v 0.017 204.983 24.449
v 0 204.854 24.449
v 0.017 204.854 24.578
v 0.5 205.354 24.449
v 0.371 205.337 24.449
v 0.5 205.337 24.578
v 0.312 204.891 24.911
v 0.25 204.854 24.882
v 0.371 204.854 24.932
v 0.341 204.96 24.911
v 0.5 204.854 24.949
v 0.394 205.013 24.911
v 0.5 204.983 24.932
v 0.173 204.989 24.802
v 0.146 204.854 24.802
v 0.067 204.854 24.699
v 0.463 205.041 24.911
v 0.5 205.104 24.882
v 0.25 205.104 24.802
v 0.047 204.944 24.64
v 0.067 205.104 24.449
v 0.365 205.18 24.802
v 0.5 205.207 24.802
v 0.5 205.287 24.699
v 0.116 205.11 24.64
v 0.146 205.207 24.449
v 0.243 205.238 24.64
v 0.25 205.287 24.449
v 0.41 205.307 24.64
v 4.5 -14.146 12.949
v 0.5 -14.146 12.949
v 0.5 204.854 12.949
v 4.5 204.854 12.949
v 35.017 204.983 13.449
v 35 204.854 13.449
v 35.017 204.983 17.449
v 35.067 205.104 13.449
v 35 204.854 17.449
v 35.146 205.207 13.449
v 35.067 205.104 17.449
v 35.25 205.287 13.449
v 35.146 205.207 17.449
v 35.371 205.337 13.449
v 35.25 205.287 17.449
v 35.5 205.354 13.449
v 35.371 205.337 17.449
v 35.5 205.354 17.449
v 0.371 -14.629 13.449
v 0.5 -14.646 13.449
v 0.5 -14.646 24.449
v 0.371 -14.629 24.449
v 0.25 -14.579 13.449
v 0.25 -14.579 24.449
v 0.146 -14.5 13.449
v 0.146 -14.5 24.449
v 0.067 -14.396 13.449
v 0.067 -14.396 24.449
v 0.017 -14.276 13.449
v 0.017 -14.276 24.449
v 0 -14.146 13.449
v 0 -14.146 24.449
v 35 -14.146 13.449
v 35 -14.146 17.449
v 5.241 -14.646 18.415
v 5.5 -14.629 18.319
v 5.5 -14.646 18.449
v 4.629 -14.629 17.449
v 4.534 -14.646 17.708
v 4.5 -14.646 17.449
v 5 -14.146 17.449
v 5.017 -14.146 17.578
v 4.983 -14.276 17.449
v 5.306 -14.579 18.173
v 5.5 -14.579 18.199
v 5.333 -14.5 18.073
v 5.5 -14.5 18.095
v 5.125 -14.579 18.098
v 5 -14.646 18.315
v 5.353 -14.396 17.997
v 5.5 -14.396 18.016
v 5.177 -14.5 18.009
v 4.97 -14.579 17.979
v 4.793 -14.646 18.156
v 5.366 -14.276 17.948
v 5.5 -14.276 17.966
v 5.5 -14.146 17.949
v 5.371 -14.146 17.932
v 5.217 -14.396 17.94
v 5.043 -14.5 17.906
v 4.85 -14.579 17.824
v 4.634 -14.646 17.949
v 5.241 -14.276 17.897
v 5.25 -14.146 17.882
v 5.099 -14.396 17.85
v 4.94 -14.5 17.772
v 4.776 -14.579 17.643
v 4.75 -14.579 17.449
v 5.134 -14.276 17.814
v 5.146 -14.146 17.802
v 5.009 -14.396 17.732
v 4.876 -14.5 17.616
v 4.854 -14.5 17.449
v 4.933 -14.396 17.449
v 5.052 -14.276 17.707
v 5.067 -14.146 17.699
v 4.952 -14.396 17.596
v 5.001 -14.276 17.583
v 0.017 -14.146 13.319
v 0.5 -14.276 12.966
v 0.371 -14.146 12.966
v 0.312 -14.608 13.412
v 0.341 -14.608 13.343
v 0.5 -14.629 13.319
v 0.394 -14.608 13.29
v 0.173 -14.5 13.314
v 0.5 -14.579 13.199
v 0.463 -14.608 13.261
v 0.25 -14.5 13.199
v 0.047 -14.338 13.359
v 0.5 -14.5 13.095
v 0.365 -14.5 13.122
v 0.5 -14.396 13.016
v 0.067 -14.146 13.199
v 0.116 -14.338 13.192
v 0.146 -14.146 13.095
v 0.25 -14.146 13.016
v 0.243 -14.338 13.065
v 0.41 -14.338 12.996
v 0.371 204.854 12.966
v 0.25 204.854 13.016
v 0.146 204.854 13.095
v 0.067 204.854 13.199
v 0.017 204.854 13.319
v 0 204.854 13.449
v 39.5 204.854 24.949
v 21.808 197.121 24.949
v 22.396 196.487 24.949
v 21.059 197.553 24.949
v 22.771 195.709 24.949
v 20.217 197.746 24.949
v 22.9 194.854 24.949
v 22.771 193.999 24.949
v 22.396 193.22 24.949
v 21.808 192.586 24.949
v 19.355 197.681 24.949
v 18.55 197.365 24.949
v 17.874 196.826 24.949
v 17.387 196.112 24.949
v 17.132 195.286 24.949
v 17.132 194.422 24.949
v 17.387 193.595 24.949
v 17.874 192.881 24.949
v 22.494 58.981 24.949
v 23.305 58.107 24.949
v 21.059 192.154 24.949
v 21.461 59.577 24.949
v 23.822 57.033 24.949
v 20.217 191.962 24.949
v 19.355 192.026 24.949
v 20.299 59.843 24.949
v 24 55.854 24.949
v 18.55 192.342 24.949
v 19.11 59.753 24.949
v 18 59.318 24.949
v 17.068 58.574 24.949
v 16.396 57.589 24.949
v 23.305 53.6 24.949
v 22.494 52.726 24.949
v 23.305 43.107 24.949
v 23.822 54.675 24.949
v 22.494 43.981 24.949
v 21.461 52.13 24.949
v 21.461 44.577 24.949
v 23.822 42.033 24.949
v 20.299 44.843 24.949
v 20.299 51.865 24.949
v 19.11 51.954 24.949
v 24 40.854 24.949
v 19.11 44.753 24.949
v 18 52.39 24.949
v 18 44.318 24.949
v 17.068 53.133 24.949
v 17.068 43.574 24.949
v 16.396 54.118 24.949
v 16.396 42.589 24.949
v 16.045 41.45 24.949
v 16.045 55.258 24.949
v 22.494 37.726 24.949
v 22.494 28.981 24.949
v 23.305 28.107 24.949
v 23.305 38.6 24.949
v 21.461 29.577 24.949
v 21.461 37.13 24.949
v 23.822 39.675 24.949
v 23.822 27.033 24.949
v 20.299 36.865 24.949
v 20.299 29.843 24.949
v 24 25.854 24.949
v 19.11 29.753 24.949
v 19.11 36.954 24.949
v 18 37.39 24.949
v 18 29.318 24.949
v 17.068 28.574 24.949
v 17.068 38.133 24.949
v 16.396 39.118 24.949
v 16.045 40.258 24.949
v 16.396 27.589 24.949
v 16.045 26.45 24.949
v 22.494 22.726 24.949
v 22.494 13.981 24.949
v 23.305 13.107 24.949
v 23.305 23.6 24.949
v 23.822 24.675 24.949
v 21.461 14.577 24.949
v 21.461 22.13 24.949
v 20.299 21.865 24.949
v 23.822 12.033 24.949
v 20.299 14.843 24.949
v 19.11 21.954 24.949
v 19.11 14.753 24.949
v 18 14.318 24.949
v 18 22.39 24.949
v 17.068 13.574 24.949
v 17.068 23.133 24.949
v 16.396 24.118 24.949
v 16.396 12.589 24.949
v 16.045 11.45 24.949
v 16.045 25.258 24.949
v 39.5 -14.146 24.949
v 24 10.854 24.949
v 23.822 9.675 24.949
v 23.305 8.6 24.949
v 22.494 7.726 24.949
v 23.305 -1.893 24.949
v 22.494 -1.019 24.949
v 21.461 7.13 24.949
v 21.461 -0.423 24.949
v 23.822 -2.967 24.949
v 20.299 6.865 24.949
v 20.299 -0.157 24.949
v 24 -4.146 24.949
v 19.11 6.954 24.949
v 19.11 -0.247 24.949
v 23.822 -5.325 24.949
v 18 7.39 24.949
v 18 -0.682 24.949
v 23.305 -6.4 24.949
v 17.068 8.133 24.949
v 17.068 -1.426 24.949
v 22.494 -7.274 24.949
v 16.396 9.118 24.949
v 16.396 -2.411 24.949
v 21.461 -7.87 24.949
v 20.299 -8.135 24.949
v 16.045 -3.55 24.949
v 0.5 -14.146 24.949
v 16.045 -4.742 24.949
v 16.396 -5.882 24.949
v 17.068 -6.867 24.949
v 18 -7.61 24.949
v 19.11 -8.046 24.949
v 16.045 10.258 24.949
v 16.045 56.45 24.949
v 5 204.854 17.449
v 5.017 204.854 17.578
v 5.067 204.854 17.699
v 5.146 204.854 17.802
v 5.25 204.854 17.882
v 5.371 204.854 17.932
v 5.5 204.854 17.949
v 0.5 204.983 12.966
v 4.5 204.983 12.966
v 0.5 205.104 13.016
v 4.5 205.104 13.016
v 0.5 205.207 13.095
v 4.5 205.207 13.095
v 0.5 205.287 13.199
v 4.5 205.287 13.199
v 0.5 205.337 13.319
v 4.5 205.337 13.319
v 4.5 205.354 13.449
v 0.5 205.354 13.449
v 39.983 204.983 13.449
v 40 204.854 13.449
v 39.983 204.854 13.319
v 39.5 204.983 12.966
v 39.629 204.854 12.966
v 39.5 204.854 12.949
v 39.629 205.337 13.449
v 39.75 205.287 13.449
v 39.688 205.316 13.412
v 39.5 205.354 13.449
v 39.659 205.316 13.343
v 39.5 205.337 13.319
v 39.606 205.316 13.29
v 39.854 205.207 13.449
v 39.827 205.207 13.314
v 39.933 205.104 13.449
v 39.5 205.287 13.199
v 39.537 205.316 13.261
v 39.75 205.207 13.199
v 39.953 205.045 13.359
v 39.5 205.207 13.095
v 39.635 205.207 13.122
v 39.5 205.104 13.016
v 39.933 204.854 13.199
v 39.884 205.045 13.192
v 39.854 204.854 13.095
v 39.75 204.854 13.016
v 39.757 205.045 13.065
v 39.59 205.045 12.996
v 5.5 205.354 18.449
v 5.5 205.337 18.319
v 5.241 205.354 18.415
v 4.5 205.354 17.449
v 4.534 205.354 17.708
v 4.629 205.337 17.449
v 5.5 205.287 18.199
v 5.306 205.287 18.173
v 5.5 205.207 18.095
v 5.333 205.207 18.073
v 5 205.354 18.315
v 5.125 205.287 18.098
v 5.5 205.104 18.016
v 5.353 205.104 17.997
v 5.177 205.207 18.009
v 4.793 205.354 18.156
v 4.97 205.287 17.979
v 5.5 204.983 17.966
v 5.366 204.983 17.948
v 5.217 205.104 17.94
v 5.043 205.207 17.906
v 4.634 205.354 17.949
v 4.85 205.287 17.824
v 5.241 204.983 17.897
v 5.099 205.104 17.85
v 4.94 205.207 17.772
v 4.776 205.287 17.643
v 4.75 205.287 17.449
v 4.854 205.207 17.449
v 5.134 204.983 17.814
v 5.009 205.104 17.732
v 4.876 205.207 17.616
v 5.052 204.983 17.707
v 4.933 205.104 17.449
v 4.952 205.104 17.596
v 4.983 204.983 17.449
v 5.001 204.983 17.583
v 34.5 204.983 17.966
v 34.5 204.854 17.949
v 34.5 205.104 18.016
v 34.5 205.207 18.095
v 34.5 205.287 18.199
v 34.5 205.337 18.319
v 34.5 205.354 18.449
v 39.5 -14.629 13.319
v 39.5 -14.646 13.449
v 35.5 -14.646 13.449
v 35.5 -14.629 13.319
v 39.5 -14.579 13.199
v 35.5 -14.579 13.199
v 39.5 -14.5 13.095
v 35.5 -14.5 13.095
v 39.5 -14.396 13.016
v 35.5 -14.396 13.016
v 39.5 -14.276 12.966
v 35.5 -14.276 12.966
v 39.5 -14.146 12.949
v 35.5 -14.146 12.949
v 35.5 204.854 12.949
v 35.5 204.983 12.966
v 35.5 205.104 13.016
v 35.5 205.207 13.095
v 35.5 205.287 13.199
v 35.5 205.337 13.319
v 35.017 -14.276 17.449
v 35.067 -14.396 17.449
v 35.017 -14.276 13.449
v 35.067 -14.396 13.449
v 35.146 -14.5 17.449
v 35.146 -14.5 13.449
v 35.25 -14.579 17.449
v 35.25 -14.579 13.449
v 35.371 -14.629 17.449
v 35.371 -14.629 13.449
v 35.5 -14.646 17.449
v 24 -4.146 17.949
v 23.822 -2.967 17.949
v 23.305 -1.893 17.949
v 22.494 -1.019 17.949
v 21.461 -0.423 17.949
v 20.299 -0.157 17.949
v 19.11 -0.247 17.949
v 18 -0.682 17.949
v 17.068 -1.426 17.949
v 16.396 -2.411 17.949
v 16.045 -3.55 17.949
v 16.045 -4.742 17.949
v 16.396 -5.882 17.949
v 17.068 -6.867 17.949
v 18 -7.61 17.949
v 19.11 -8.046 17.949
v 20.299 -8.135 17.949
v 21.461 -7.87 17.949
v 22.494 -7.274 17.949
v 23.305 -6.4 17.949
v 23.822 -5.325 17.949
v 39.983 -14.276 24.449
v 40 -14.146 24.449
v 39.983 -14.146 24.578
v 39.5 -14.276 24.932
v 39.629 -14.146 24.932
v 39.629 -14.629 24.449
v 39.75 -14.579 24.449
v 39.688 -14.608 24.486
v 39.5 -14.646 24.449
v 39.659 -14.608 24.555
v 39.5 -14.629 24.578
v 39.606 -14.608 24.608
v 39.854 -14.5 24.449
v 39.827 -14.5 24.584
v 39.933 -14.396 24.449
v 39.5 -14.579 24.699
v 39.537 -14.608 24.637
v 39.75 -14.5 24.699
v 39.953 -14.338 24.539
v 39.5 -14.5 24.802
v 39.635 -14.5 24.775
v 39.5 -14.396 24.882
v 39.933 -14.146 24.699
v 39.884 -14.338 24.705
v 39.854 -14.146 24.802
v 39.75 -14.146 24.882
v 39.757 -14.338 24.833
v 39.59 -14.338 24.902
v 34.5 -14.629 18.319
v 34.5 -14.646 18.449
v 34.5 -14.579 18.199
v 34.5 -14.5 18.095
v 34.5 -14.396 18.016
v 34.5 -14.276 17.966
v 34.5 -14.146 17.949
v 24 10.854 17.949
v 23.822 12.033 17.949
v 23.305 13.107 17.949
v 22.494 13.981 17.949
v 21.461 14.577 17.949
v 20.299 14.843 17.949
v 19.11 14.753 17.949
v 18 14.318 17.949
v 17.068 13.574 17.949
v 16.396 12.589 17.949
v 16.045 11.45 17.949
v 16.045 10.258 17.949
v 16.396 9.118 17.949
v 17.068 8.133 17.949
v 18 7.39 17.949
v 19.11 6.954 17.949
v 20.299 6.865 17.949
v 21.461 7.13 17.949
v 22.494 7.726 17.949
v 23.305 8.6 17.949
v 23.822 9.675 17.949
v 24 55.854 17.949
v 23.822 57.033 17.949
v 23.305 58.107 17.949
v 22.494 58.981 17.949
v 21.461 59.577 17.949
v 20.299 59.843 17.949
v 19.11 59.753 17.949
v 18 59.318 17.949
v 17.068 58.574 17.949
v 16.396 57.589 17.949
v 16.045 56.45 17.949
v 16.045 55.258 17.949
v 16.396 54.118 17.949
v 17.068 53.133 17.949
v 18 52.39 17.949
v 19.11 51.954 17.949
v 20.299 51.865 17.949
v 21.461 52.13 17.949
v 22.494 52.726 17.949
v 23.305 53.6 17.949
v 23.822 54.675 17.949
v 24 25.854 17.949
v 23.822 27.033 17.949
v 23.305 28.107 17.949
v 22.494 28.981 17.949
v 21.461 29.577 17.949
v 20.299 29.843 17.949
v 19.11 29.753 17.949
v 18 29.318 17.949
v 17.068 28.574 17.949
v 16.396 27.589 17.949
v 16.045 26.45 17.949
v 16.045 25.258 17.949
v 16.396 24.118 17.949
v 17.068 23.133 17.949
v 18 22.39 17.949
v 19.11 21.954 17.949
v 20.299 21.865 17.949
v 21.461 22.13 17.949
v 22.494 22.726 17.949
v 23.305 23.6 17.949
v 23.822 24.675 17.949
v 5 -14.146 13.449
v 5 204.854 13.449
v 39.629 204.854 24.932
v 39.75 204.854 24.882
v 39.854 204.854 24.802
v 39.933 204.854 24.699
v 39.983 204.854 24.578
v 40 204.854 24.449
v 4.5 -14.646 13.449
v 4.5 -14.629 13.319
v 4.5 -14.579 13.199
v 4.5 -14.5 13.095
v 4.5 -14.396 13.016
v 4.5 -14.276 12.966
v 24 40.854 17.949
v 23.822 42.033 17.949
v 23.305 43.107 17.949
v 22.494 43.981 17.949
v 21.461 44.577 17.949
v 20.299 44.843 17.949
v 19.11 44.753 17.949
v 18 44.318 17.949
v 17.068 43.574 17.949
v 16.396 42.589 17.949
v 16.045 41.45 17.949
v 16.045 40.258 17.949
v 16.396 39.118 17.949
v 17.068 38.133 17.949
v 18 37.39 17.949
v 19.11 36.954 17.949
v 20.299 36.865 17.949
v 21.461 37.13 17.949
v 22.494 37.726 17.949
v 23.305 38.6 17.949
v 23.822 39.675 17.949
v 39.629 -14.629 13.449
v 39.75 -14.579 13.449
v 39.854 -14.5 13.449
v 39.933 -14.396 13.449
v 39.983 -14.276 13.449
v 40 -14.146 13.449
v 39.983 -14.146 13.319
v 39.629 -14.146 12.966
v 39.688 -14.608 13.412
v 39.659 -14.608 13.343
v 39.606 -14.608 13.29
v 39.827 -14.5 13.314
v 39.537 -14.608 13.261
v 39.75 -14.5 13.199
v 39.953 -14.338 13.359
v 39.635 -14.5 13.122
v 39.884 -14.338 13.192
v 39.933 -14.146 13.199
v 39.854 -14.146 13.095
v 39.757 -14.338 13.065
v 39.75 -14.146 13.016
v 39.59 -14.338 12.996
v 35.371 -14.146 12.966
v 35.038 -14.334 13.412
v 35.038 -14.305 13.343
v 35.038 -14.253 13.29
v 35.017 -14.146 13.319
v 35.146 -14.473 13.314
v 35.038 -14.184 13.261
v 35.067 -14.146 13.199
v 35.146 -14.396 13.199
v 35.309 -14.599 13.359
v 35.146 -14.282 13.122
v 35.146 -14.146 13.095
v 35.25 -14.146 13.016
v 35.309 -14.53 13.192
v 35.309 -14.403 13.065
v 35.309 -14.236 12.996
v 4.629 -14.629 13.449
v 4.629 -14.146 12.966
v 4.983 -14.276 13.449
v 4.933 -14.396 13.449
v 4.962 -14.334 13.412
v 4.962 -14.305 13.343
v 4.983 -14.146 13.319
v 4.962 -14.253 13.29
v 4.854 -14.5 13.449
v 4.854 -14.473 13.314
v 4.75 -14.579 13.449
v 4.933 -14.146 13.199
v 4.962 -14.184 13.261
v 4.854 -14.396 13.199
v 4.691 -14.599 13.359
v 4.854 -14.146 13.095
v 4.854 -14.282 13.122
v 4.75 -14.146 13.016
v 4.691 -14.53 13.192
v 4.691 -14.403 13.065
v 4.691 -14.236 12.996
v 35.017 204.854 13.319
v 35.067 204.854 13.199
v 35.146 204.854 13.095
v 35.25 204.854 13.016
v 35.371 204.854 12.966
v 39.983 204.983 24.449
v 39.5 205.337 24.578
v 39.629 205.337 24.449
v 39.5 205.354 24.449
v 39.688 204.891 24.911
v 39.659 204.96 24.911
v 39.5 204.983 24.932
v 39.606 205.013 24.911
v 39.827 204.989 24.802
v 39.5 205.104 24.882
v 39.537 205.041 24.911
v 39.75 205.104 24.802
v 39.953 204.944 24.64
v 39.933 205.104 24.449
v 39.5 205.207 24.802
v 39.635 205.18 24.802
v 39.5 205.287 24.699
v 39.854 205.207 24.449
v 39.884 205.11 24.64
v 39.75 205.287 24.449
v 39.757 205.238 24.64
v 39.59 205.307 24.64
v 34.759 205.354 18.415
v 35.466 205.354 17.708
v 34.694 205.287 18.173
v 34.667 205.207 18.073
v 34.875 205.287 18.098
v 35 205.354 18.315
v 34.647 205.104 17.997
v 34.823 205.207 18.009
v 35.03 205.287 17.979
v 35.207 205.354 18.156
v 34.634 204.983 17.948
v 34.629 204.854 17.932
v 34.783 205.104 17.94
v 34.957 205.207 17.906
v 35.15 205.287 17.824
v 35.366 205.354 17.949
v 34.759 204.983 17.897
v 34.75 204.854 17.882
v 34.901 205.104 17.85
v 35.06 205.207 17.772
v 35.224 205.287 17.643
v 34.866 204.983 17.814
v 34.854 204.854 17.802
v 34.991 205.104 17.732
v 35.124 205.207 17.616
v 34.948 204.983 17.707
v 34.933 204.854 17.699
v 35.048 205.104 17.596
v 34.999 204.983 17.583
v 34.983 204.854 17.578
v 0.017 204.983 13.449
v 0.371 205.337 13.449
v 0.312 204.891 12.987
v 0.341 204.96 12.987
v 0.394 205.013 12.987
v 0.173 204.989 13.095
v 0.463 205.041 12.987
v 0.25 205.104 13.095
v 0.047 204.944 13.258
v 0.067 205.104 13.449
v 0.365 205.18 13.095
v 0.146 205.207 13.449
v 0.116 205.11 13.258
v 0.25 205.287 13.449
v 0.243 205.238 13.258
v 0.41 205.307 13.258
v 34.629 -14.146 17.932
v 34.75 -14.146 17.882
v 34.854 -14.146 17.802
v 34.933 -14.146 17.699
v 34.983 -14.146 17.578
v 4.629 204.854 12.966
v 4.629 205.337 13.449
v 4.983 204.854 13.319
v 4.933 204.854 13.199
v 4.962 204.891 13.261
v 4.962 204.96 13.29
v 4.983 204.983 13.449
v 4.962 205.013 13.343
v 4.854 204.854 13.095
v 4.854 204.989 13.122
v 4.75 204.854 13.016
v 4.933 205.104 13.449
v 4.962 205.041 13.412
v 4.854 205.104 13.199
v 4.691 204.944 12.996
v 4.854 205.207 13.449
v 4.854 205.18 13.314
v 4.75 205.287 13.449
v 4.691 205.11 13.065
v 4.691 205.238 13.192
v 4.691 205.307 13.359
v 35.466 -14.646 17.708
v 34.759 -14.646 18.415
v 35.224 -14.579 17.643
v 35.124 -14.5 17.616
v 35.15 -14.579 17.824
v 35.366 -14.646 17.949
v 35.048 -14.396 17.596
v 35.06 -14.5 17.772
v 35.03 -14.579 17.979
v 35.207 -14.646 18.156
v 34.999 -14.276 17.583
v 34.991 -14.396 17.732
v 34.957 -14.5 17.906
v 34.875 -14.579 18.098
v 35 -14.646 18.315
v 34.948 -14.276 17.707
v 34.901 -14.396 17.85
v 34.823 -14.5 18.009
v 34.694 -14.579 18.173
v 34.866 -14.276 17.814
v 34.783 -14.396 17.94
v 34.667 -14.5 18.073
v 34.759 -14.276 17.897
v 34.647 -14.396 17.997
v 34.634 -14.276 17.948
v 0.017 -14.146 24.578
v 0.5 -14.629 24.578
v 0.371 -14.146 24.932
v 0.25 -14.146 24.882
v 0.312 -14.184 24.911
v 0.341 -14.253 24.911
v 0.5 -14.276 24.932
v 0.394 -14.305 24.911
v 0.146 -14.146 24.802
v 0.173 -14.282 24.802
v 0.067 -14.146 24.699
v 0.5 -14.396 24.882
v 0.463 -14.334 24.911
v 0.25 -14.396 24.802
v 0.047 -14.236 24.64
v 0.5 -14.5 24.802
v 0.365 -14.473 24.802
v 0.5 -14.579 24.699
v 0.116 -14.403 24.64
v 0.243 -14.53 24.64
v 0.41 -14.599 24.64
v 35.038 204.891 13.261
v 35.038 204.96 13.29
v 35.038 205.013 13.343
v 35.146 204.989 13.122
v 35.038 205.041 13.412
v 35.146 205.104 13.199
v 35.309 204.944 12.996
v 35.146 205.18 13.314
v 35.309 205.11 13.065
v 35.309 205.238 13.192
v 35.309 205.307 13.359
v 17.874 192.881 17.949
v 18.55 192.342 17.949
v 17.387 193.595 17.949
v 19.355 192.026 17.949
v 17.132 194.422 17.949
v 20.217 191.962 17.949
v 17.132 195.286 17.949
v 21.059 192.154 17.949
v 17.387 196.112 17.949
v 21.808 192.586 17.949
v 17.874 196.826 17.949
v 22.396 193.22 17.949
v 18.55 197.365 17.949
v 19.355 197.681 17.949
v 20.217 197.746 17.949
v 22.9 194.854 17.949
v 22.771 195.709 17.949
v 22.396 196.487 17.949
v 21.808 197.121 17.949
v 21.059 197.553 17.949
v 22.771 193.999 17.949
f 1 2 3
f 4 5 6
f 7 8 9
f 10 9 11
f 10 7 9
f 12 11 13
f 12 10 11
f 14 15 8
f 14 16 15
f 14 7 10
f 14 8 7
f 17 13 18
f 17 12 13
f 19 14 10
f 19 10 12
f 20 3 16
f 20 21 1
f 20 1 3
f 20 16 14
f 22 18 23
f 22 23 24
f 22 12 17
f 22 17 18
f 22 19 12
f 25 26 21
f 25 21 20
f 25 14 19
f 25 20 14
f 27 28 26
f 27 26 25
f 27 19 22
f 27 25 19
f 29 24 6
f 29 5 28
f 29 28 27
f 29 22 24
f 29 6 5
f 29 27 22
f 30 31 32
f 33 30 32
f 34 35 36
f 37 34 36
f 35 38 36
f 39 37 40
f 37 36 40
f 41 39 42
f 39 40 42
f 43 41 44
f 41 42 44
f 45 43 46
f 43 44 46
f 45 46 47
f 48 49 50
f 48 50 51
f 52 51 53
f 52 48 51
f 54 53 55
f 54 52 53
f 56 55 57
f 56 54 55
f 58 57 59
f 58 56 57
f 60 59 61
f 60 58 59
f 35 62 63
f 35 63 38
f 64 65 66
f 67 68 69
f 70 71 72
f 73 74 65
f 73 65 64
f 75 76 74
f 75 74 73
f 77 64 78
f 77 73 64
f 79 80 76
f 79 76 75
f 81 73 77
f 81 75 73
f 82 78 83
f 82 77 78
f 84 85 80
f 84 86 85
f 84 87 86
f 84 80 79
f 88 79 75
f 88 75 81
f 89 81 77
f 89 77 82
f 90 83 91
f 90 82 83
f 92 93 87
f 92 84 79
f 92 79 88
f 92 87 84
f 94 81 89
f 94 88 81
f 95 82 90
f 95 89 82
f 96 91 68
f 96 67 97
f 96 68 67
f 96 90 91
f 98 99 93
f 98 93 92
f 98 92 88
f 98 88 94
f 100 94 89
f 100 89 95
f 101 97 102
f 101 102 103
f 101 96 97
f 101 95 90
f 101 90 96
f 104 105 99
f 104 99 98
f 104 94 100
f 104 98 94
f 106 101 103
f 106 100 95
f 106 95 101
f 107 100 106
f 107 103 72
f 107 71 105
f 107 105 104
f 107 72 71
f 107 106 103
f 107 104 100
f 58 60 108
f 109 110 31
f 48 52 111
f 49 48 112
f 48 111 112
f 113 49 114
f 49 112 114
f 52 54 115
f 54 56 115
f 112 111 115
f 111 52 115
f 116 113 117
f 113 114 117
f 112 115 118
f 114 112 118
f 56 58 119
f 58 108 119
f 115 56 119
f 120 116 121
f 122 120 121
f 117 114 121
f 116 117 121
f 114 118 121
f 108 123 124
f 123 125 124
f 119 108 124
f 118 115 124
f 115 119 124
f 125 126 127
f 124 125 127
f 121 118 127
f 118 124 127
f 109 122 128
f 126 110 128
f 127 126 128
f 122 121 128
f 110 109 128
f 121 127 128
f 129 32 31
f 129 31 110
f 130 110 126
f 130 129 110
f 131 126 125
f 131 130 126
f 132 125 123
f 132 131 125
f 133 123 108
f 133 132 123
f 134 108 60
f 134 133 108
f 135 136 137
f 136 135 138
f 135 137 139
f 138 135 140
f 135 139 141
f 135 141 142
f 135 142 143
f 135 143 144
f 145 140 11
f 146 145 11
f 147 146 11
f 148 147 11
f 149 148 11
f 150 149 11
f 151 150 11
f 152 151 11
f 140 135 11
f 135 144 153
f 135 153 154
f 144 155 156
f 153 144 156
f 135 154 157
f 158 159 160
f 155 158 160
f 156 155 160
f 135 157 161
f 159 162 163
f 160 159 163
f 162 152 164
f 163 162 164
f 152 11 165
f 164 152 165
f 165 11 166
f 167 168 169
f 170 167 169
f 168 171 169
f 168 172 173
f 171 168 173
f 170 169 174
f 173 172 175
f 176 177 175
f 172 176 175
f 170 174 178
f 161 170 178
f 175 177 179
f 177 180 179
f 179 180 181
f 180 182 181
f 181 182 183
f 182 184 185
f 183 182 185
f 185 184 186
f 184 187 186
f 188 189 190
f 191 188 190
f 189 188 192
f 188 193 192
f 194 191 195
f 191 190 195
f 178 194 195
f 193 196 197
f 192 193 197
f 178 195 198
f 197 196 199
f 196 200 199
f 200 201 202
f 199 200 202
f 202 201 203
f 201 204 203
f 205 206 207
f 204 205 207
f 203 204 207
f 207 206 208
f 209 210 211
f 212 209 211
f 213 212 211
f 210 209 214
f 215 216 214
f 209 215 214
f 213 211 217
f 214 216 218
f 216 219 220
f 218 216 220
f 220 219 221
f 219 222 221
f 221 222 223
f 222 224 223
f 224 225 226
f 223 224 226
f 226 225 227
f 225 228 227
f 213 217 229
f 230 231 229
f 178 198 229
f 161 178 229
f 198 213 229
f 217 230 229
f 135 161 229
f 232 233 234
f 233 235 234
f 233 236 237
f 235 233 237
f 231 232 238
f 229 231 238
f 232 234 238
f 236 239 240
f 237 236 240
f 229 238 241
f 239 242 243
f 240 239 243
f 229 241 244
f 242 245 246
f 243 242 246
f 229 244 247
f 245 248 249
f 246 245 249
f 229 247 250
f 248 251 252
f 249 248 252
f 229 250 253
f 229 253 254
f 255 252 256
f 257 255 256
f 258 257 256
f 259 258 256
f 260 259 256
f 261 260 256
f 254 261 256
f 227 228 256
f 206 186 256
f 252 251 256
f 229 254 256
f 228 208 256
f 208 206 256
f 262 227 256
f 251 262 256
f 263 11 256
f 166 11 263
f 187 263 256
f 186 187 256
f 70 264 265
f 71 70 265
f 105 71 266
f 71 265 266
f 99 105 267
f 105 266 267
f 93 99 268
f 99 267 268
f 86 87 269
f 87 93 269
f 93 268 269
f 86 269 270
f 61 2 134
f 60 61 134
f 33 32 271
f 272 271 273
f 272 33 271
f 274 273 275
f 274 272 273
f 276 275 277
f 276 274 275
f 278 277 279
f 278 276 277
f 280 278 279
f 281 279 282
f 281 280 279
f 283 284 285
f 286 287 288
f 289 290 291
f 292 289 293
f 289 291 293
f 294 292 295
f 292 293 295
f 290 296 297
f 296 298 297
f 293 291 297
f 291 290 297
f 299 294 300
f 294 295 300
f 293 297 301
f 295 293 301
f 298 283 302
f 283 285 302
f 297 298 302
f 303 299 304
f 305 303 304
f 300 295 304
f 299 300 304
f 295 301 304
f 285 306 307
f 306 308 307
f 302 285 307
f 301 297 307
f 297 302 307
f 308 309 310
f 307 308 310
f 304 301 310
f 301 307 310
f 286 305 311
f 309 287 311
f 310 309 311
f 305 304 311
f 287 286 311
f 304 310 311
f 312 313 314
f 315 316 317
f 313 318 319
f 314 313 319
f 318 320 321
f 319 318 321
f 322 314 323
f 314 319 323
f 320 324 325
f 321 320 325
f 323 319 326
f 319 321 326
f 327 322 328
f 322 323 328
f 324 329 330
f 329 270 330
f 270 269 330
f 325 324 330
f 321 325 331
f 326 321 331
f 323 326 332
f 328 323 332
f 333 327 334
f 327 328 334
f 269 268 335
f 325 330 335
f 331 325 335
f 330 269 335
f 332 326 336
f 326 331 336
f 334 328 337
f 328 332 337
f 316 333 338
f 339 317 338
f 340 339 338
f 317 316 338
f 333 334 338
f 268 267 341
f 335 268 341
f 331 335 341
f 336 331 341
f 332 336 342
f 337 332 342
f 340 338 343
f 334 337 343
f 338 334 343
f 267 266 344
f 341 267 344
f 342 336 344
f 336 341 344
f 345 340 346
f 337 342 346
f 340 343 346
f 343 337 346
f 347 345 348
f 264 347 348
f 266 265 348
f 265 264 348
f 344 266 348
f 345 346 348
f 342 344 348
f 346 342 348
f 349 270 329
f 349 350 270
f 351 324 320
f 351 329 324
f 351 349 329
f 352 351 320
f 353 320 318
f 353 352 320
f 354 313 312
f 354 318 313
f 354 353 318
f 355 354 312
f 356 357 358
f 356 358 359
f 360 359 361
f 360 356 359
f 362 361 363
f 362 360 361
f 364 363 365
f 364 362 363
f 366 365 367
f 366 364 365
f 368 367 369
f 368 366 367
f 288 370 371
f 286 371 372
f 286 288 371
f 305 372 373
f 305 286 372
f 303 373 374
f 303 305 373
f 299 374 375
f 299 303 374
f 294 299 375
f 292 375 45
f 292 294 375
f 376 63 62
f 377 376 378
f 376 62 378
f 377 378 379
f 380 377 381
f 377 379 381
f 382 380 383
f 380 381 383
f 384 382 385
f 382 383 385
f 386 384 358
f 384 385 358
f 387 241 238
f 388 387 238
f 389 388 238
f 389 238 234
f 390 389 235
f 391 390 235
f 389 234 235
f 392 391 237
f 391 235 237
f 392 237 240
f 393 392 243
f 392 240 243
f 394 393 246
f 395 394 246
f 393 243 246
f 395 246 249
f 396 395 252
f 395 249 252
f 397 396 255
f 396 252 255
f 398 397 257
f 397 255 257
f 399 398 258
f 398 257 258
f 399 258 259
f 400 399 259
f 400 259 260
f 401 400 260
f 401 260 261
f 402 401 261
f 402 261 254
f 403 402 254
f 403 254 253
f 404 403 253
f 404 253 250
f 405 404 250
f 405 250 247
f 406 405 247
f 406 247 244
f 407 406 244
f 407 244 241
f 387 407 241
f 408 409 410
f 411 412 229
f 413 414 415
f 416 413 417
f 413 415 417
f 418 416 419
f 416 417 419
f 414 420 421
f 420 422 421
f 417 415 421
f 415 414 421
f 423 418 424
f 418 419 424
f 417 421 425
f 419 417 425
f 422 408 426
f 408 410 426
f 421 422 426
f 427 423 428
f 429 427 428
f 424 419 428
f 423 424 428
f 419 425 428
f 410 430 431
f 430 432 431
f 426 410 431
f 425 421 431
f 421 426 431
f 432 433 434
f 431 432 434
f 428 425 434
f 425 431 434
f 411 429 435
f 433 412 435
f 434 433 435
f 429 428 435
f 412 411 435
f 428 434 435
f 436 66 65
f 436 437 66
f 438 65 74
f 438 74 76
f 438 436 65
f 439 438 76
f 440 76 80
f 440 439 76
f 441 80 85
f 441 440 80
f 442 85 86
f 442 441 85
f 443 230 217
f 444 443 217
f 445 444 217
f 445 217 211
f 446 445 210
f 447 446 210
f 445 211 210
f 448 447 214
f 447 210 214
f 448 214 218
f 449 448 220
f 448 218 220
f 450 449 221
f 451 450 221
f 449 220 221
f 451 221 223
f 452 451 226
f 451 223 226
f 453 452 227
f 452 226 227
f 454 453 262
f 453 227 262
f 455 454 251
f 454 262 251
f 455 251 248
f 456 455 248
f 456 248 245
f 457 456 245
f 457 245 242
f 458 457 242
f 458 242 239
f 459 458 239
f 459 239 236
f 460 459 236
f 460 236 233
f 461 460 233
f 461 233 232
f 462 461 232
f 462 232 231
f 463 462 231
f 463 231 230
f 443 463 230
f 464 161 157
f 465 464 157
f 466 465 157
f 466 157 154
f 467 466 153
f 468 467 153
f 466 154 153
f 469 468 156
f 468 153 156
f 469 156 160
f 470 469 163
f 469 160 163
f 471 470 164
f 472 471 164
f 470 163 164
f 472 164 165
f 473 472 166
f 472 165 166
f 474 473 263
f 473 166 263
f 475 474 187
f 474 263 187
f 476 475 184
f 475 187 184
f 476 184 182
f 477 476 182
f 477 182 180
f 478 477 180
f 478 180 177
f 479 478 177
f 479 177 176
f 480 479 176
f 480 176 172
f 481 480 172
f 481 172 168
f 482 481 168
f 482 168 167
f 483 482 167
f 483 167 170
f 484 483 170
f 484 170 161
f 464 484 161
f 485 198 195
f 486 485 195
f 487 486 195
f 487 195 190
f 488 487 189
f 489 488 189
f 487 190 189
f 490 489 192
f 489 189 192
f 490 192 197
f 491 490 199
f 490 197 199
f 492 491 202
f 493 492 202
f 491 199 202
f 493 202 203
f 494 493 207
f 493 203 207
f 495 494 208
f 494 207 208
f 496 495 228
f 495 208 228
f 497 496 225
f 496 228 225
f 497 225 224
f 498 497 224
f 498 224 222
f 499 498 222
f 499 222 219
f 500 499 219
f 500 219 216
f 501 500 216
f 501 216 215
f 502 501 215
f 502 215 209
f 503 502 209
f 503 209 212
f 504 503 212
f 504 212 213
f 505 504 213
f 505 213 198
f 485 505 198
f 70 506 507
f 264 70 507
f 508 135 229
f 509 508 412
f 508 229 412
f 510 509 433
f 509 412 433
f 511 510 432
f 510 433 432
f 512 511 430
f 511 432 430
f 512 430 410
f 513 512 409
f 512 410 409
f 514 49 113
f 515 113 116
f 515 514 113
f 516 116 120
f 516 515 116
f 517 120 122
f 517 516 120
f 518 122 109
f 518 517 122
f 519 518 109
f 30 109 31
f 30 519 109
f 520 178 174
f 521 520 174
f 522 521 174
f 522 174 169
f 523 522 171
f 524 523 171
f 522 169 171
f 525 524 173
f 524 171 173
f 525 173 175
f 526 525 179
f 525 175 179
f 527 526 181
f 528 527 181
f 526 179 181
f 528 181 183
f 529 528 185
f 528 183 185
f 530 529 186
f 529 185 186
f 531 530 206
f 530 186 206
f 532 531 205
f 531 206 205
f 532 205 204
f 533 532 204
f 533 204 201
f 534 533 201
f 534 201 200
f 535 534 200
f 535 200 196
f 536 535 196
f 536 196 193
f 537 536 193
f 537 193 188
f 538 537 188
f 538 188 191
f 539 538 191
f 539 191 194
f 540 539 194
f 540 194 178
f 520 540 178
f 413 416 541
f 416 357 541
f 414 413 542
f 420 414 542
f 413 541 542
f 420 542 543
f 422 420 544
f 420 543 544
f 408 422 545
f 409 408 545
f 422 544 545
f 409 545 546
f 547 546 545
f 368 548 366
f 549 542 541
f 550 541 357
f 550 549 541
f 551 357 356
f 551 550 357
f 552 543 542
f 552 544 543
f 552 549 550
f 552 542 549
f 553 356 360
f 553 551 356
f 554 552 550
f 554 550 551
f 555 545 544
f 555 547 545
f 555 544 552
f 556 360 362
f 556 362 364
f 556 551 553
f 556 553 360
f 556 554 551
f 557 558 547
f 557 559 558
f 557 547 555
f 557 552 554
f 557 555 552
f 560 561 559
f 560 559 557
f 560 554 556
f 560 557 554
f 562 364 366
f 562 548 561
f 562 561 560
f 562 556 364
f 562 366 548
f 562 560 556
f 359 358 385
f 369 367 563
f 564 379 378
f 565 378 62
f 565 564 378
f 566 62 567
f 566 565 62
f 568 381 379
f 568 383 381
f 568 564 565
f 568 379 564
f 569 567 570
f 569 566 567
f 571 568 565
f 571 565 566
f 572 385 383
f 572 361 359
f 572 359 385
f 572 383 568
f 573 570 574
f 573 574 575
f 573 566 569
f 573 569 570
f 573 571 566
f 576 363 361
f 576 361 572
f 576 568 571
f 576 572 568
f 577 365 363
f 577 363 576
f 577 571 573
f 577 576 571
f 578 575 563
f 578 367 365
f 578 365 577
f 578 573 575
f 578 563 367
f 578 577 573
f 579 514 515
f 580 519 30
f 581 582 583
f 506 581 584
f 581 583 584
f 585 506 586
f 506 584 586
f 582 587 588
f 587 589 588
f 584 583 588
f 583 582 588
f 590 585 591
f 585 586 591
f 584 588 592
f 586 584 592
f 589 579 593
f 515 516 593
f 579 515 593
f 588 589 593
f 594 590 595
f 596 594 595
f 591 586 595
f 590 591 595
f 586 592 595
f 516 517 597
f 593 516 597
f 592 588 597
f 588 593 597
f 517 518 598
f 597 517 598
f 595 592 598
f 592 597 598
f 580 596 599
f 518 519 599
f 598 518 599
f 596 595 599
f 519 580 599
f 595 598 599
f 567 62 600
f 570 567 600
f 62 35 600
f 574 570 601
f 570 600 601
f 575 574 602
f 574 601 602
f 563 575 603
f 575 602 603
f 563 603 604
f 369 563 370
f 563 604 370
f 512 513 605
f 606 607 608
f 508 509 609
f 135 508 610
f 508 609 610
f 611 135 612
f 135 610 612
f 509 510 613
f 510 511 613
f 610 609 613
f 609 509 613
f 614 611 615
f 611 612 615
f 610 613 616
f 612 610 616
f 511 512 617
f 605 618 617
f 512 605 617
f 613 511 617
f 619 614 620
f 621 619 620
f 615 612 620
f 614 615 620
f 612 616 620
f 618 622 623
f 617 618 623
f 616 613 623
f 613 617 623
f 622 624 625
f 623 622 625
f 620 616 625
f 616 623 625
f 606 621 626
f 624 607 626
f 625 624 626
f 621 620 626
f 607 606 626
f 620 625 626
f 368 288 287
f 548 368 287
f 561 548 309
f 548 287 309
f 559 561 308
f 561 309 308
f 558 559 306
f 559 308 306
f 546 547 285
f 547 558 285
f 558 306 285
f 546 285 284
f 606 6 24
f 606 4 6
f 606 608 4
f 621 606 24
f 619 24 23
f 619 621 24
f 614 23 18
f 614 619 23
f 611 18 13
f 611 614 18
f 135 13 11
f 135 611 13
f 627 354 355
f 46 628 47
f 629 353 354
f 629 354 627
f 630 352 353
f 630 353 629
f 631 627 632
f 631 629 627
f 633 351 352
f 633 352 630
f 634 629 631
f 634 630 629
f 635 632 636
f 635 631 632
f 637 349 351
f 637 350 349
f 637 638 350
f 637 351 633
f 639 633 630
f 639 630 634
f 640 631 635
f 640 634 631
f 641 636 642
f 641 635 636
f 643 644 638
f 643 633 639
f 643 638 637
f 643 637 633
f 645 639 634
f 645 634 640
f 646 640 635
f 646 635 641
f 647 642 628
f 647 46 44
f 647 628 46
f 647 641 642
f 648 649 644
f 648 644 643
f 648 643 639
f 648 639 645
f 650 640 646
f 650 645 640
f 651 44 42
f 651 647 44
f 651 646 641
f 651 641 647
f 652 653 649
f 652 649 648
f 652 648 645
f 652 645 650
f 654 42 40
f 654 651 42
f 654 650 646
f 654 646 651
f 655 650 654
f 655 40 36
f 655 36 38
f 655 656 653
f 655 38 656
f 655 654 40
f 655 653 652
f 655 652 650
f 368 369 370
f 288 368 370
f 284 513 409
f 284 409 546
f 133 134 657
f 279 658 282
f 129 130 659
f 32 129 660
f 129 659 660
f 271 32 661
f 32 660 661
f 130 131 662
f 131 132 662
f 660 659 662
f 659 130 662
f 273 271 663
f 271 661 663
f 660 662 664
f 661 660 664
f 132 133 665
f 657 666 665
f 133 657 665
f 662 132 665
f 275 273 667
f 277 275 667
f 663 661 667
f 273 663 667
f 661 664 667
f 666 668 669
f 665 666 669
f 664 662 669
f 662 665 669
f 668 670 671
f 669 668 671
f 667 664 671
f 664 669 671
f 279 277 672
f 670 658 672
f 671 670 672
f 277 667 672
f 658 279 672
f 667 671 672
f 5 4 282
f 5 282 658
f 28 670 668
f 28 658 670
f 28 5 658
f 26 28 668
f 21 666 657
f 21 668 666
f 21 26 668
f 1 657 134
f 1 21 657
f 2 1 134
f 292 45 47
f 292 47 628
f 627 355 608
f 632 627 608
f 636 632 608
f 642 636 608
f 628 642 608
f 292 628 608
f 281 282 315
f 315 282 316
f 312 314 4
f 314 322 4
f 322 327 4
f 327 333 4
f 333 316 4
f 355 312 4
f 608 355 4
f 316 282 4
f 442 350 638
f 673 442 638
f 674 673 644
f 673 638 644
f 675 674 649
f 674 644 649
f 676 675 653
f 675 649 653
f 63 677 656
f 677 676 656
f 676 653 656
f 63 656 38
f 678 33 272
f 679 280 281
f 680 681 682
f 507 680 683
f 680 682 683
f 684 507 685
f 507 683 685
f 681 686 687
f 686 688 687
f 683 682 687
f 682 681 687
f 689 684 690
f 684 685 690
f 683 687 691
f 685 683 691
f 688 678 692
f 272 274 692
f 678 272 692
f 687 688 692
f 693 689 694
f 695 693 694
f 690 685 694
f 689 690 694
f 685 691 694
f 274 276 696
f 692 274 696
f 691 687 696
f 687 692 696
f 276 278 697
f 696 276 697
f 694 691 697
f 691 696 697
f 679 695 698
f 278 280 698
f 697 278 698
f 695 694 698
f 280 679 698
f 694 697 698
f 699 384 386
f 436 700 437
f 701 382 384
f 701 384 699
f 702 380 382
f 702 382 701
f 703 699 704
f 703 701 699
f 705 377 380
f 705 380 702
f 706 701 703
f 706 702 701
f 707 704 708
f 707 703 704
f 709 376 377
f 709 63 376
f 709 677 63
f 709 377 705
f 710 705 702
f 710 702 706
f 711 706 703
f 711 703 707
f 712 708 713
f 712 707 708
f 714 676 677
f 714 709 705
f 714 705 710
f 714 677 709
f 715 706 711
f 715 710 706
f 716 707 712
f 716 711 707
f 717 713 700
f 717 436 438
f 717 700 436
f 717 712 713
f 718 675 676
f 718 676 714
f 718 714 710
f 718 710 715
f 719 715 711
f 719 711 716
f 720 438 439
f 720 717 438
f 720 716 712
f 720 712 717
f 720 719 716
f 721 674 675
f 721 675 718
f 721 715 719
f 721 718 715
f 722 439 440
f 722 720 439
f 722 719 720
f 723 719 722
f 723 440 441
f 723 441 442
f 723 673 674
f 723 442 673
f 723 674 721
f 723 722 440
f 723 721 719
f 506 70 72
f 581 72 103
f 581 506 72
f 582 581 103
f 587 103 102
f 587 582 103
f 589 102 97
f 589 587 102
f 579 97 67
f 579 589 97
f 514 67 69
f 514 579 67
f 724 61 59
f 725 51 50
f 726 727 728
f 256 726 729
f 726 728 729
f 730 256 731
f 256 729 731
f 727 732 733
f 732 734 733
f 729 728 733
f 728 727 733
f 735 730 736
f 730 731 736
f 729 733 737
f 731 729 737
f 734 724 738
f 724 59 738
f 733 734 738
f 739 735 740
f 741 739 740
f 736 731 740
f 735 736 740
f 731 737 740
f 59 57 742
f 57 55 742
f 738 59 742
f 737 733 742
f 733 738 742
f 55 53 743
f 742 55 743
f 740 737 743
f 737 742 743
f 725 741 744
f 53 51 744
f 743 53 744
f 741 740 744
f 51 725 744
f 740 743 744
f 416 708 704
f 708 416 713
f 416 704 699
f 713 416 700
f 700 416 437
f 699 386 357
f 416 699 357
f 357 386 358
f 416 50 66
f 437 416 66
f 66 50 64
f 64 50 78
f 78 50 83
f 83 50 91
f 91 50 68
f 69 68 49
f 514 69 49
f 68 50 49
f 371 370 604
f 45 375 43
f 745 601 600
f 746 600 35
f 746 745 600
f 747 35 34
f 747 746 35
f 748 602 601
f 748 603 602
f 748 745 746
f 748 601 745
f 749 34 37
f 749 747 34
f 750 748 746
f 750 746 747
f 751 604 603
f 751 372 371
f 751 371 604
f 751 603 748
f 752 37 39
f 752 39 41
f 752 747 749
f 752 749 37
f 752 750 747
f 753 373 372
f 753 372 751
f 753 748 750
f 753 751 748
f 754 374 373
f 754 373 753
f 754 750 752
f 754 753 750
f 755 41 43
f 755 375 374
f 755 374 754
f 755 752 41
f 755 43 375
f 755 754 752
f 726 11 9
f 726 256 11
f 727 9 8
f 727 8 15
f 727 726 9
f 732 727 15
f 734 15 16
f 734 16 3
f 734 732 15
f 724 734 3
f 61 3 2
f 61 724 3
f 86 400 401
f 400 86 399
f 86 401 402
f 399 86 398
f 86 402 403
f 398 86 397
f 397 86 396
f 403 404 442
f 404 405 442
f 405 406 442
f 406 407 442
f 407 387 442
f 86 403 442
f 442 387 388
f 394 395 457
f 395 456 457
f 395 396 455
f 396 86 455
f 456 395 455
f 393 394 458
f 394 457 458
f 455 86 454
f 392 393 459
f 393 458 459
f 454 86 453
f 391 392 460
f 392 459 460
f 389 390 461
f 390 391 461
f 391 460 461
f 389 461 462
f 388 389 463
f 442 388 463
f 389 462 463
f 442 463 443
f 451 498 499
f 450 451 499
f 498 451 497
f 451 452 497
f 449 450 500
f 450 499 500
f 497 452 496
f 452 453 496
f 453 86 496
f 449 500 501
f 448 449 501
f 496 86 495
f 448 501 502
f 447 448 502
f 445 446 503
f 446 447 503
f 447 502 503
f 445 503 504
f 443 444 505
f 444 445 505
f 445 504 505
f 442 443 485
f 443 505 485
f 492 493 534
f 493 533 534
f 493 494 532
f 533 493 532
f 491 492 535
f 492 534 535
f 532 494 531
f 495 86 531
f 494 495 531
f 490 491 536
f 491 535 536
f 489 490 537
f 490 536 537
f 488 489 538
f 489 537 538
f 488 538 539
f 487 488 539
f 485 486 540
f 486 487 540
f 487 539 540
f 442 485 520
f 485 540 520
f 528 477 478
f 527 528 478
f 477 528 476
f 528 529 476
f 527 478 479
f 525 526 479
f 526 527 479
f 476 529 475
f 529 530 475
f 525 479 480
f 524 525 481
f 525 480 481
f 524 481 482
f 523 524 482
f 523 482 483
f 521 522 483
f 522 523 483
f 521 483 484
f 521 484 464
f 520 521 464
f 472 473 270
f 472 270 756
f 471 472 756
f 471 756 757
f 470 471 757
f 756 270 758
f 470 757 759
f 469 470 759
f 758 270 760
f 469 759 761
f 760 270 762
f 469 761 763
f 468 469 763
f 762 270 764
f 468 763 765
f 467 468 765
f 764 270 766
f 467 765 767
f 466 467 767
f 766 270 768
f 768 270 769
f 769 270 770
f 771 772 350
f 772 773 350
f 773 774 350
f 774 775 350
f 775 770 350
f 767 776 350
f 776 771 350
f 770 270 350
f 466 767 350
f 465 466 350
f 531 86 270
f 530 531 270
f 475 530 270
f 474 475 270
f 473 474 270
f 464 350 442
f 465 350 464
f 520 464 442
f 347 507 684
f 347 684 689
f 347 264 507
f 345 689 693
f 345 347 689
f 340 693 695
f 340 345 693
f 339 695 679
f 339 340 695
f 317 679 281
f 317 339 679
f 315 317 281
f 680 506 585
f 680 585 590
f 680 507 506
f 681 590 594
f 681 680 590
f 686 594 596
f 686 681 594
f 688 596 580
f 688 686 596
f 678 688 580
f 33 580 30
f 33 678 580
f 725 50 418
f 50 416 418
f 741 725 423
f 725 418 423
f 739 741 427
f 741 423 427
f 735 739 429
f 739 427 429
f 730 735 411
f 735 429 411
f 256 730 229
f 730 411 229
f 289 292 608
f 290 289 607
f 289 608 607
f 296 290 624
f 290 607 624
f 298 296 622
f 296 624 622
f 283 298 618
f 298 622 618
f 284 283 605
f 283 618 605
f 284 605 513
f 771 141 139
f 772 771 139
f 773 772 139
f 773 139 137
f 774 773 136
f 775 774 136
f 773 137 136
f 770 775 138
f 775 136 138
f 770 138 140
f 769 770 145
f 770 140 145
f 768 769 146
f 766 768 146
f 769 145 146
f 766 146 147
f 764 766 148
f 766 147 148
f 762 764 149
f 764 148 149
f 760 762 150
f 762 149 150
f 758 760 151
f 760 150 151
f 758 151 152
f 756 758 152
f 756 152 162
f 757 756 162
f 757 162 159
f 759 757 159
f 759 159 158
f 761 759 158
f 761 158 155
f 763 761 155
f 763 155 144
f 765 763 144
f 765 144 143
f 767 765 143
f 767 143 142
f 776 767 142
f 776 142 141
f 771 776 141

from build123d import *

# Parameters (mm, degrees)
SALIENTE_EXTRUIR1_DEPTH = 40
REDONDEO1_R             = 0.5
CROQUIS5_W              = 30
CROQUIS5_H              = 220
CORTAR_EXTRUIR2_DEPTH   = 5
CORTAR_EXTRUIR3_REACH   = 211.557
CROQUIS6_R              = 4
CROQUIS6_R_2            = 2.9
REDONDEO2_R             = 0.5


with BuildPart() as part:
    # Croquis2 → Saliente-Extruir1 (new body)
    with BuildSketch(Plane(origin=(0, 0, 0), x_dir=(0, 0, -1), z_dir=(1, 0, 0))):
        Polygon((-24.94884824, -14.646248332), (-12.94884824, -14.646248332), (-12.94884824, -5.646248332), (-12.94884824, 205.353751668), (-24.94884824, 205.353751668), align=None)
    extrude(amount=SALIENTE_EXTRUIR1_DEPTH)

    # Redondeo1
    redondeo1_edges = [part.edges().sort_by_distance(p)[0] for p in [
        (40, 95.353751668, 12.94884824),
        (40, 205.353751668, 18.94884824),
        (40, 95.353751668, 24.94884824),
        (0, 205.353751668, 18.94884824),
        (0, 95.353751668, 12.94884824),
        (0, -14.646248332, 18.94884824),
        (0, 95.353751668, 24.94884824),
        (40, -14.646248332, 18.94884824),
        (20, 205.353751668, 24.94884824),
        (20, 205.353751668, 12.94884824),
        (20, -14.646248332, 12.94884824),
        (20, -14.646248332, 24.94884824),
    ]]
    fillet(redondeo1_edges, radius=REDONDEO1_R)

    # Croquis5 → Cortar-Extruir2 (cut)
    with BuildSketch(Plane.XY.offset(12.94884824)):
        with Locations((20, 95.353751668)):
            Rectangle(CROQUIS5_W, CROQUIS5_H)
    extrude(amount=CORTAR_EXTRUIR2_DEPTH, mode=Mode.SUBTRACT)

    # Croquis6 → Cortar-Extruir3 (cut, up to next)
    with BuildSketch(Plane.XY.offset(24.94884824), mode=Mode.PRIVATE) as cortar_extruir3_sk1:
        with Locations((20, -4.146248332)):
            Circle(CROQUIS6_R)
    cortar_extruir3_tool1 = extrude(cortar_extruir3_sk1.sketch, amount=-CORTAR_EXTRUIR3_REACH, mode=Mode.PRIVATE) & part.part
    # Croquis6 → Cortar-Extruir3 (cut, up to next)
    with BuildSketch(Plane.XY.offset(24.94884824), mode=Mode.PRIVATE) as cortar_extruir3_sk2:
        with Locations((20, 194.853751668)):
            Circle(CROQUIS6_R_2)
    cortar_extruir3_tool2 = extrude(cortar_extruir3_sk2.sketch, amount=-CORTAR_EXTRUIR3_REACH, mode=Mode.PRIVATE) & part.part
    # Croquis6 → Cortar-Extruir3 (cut, up to next)
    with BuildSketch(Plane.XY.offset(24.94884824), mode=Mode.PRIVATE) as cortar_extruir3_sk3:
        with Locations((20, 10.853751668)):
            Circle(CROQUIS6_R)
    cortar_extruir3_tool3 = extrude(cortar_extruir3_sk3.sketch, amount=-CORTAR_EXTRUIR3_REACH, mode=Mode.PRIVATE) & part.part
    # Croquis6 → Cortar-Extruir3 (cut, up to next)
    with BuildSketch(Plane.XY.offset(24.94884824), mode=Mode.PRIVATE) as cortar_extruir3_sk4:
        with Locations((20, 25.853751668)):
            Circle(CROQUIS6_R)
    cortar_extruir3_tool4 = extrude(cortar_extruir3_sk4.sketch, amount=-CORTAR_EXTRUIR3_REACH, mode=Mode.PRIVATE) & part.part
    # Croquis6 → Cortar-Extruir3 (cut, up to next)
    with BuildSketch(Plane.XY.offset(24.94884824), mode=Mode.PRIVATE) as cortar_extruir3_sk5:
        with Locations((20, 40.853751668)):
            Circle(CROQUIS6_R)
    cortar_extruir3_tool5 = extrude(cortar_extruir3_sk5.sketch, amount=-CORTAR_EXTRUIR3_REACH, mode=Mode.PRIVATE) & part.part
    # Croquis6 → Cortar-Extruir3 (cut, up to next)
    with BuildSketch(Plane.XY.offset(24.94884824), mode=Mode.PRIVATE) as cortar_extruir3_sk6:
        with Locations((20, 55.853751668)):
            Circle(CROQUIS6_R)
    cortar_extruir3_tool6 = extrude(cortar_extruir3_sk6.sketch, amount=-CORTAR_EXTRUIR3_REACH, mode=Mode.PRIVATE) & part.part
    add(cortar_extruir3_tool1.solids().sort_by_distance((20, -4.146248, 24.948848))[0], mode=Mode.SUBTRACT)
    add(cortar_extruir3_tool2.solids().sort_by_distance((20, 194.853752, 24.948848))[0], mode=Mode.SUBTRACT)
    add(cortar_extruir3_tool3.solids().sort_by_distance((20, 10.853752, 24.948848))[0], mode=Mode.SUBTRACT)
    add(cortar_extruir3_tool4.solids().sort_by_distance((20, 25.853752, 24.948848))[0], mode=Mode.SUBTRACT)
    add(cortar_extruir3_tool5.solids().sort_by_distance((20, 40.853752, 24.948848))[0], mode=Mode.SUBTRACT)
    add(cortar_extruir3_tool6.solids().sort_by_distance((20, 55.853752, 24.948848))[0], mode=Mode.SUBTRACT)

    # Redondeo2
    redondeo2_edges = [part.edges().sort_by_distance(p)[0] for p in [
        (35, 205.207305058, 13.095294849),
        (5, 205.207305058, 13.095294849),
        (35, 205.353751668, 15.69884824),
        (5, 95.353751668, 12.94884824),
        (5, -14.499801723, 13.095294849),
        (5, 205.353751668, 15.69884824),
        (5, -14.646248332, 15.69884824),
        (35, -14.646248332, 15.69884824),
        (35, -14.499801723, 13.095294849),
        (35, 95.353751668, 12.94884824),
        (5, 95.353751668, 17.94884824),
        (20, -14.646248332, 17.94884824),
        (35, 95.353751668, 17.94884824),
        (20, 205.353751668, 17.94884824),
    ]]
    fillet(redondeo2_edges, radius=REDONDEO2_R)


solid = part.part
